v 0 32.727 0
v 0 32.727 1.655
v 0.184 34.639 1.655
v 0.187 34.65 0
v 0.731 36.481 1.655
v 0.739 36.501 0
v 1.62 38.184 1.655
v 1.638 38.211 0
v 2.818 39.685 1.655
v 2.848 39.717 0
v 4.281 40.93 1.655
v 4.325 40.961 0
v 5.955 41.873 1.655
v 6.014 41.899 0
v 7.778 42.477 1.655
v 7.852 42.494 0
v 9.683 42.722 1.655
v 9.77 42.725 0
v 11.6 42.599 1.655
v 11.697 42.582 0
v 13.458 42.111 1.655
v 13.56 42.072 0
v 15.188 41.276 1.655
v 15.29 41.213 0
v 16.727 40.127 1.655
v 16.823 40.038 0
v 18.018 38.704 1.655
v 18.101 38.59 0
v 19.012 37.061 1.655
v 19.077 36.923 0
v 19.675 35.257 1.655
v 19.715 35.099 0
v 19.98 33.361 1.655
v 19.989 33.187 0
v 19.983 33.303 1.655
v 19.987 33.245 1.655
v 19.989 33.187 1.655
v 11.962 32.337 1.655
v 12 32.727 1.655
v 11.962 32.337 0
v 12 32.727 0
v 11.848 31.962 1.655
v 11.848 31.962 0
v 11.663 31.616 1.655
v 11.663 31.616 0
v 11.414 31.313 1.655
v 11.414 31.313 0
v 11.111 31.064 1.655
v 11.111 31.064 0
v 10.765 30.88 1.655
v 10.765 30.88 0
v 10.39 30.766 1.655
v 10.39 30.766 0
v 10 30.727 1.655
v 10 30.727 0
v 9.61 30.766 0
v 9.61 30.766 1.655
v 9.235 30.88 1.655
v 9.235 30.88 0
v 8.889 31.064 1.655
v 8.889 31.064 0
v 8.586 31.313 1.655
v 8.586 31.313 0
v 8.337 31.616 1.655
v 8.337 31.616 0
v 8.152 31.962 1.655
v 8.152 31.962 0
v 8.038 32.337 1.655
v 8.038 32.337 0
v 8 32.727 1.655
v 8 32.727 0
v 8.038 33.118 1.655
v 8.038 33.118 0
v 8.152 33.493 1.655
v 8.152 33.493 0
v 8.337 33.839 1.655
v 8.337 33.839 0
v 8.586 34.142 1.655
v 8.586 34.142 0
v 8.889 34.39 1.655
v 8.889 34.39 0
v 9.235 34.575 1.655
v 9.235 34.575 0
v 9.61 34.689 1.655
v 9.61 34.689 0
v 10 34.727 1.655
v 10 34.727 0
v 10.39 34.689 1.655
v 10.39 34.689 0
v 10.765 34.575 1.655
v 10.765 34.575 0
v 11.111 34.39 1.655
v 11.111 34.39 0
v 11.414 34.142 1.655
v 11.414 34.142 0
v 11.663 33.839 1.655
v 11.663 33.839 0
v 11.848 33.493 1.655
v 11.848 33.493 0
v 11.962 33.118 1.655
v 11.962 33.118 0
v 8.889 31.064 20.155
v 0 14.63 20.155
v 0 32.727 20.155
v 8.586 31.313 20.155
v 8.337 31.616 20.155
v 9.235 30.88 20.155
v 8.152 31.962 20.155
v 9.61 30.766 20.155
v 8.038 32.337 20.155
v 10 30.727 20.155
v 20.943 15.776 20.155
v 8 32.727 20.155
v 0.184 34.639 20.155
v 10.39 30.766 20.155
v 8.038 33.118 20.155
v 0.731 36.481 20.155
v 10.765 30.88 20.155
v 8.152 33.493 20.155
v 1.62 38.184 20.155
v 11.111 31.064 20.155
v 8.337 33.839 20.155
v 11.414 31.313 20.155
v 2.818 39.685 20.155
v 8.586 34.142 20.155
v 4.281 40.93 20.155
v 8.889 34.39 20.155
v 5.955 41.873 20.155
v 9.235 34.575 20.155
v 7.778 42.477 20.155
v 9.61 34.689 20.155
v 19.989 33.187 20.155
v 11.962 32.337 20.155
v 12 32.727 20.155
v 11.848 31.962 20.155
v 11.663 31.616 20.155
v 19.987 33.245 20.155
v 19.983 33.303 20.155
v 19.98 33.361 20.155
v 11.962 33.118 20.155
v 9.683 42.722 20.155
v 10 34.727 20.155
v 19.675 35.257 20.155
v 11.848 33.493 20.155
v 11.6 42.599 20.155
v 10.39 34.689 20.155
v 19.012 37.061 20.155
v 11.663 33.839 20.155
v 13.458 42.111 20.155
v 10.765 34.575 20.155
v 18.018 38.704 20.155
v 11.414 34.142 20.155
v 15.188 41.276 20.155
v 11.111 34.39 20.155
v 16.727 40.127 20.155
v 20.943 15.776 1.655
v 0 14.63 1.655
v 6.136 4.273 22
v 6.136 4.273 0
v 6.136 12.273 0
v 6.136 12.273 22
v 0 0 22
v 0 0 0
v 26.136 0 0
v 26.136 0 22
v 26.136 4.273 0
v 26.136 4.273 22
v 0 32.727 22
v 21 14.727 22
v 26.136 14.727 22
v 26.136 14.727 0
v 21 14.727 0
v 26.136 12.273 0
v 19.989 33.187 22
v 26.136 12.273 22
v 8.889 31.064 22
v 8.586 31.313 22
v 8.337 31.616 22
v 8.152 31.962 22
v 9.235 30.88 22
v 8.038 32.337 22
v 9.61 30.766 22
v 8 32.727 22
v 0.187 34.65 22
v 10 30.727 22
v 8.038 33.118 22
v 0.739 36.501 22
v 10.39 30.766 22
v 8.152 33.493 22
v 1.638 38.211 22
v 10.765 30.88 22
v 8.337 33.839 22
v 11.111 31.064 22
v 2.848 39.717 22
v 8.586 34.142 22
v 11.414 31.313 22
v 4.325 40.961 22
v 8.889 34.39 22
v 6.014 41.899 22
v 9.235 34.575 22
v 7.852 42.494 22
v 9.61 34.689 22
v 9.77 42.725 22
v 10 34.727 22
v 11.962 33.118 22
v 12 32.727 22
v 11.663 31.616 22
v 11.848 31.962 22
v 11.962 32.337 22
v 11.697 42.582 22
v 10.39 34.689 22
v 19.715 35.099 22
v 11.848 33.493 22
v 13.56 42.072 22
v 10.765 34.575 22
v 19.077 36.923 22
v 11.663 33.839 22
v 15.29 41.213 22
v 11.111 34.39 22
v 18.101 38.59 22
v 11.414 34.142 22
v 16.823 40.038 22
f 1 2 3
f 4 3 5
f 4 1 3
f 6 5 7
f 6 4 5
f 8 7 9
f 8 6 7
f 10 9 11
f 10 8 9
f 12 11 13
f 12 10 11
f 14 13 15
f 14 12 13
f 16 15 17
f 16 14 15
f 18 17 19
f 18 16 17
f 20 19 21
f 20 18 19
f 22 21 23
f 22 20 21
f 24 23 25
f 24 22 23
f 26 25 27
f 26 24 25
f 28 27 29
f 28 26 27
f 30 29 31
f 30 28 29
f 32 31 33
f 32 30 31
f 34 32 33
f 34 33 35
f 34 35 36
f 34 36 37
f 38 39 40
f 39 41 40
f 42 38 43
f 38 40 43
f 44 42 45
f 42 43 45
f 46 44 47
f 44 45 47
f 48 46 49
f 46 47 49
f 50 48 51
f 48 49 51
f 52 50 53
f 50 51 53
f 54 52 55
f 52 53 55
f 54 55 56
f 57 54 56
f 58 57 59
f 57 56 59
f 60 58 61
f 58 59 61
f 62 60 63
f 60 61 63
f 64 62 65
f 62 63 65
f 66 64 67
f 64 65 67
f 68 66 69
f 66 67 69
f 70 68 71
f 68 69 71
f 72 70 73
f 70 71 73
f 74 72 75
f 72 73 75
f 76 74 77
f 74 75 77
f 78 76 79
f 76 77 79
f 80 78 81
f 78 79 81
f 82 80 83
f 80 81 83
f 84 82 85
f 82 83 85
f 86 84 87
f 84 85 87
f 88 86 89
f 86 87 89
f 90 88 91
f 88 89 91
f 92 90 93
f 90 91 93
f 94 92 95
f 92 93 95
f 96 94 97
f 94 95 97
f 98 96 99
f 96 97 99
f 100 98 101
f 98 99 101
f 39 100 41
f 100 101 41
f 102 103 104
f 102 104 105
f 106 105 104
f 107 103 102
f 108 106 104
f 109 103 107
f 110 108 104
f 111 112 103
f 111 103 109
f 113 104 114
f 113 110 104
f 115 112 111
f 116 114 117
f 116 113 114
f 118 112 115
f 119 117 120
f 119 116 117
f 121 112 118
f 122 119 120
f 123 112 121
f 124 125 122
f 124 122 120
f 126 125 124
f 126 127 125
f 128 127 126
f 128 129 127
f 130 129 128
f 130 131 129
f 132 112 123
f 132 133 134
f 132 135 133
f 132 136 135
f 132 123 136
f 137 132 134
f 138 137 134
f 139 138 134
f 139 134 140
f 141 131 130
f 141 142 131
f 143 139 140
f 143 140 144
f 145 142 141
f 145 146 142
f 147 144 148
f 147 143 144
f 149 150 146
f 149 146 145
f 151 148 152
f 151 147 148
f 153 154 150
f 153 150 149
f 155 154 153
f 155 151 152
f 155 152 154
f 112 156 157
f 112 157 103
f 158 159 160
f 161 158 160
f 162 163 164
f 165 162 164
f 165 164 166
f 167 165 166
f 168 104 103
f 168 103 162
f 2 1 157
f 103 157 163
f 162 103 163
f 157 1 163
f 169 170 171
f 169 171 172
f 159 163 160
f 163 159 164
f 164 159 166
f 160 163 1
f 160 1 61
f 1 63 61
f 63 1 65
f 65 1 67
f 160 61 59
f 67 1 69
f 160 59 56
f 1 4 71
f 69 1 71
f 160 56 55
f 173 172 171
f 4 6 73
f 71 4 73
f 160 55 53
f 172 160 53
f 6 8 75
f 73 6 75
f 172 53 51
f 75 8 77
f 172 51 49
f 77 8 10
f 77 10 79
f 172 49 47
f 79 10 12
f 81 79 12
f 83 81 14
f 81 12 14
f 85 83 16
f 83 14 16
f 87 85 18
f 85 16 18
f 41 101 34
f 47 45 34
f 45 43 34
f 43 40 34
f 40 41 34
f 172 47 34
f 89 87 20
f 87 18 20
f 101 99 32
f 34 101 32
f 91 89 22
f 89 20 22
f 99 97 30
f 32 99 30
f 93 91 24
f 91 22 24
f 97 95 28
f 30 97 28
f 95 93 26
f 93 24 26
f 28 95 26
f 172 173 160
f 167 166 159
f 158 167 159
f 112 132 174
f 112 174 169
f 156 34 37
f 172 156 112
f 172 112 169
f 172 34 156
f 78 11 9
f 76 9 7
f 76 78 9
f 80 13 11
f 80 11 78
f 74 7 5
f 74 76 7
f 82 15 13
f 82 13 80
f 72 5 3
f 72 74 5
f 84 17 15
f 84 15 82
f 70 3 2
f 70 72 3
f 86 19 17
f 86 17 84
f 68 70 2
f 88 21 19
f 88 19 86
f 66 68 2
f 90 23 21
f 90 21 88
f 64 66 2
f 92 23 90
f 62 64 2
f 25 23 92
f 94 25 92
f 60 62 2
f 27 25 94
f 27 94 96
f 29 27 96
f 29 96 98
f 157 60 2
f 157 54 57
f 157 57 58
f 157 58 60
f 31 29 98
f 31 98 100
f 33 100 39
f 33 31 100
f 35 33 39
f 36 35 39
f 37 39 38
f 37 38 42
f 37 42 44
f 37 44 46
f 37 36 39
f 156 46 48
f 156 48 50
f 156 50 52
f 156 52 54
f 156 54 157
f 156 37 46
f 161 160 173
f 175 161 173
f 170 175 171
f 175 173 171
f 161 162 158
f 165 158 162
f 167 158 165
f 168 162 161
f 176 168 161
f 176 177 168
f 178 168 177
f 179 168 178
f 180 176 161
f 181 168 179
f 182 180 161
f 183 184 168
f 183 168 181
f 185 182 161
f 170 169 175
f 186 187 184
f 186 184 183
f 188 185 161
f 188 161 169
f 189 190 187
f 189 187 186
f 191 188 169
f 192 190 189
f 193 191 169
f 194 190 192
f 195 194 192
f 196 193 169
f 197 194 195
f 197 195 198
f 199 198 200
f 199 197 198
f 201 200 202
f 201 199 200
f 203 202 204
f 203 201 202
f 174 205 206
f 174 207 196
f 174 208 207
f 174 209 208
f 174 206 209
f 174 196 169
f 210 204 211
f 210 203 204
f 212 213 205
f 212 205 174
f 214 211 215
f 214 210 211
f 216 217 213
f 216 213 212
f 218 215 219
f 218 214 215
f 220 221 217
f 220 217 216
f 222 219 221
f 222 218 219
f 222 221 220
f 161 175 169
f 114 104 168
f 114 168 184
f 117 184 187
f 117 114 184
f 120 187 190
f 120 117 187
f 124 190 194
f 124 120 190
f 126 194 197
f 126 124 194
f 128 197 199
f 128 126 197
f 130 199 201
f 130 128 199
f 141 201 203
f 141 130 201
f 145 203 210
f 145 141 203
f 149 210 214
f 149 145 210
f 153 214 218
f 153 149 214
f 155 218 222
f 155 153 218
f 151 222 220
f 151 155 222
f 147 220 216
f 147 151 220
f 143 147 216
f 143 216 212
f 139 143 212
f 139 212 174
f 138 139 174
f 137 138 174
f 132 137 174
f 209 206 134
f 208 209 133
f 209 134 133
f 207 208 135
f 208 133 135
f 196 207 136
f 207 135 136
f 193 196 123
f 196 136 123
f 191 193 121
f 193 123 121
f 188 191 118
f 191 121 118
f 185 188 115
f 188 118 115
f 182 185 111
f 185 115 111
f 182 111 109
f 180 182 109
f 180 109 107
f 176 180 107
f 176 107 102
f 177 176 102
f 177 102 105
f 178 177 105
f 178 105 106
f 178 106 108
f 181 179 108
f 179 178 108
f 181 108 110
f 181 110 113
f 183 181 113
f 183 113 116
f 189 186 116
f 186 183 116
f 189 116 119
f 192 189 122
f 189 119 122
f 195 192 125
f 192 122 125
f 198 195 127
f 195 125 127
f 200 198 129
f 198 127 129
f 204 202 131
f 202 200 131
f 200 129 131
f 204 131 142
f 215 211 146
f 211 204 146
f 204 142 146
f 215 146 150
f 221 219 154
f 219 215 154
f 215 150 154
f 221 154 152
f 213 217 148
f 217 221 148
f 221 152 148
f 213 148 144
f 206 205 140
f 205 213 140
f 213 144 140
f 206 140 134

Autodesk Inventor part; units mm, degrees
ref_plane "YZ Plane" through (0, 0, 0) normal (1, 0, 0) x (0, 1, 0)
ref_plane "XZ Plane" through (0, 0, 0) normal (0, 1, 0) x (-1, 0, 0)
ref_plane "XY Plane" through (0, 0, 0) normal (0, 0, 1) x (1, 0, 0)
sketch "Sketch1" plane through (0, 0, 0) normal (0, 0, 1) x (1, 0, 0)
  line L0 (0, 0) -> (26.1364, 0)
  line L1 (26.1364, 0) -> (26.1364, 4.2728)
  line L2 (26.1364, 4.2728) -> (6.1364, 4.2728)
  line L3 (6.1364, 4.2728) -> (6.1364, 12.2728)
  line L4 (6.1364, 12.2728) -> (26.1364, 12.2728)
  line L5 (26.1364, 12.2728) -> (26.1364, 14.7274)
  line L6 (26.1364, 14.7274) -> (0, 14.7274)
  line L7 (0, 14.7274) -> (0, 0)
  line L8 (0, 14.7274) -> (0, 32.7274)
  arc A0 (19.9894, 33.187) -> (0, 32.7274) centre (10, 32.7274) ccw
  line L9 (19.9894, 33.187) -> (21, 14.7274)
  circle A1 centre (10, 32.7274) radius 2
  dimension "d0" = 20
  dimension "d1" = 8
  dimension "d3" = 4
  dimension "d4" = 10
  dimension "d5" = 18
  dimension "d7" = 19.9894
extrude "Extrusion1" add sketch "Sketch1" along normal blind 22
sketch "Sketch2" plane through (19.9894, 33.187, 22) normal (0.9985049, 0.0546629, 0) x (0, 0, -1)
  line L0 (1.8448, -6.1786) -> (1.8448, -17.437)
  line L1 (20.3448, -6.1786) -> (20.3448, -17.437)
  line L2 (20.3448, -17.437) -> (1.8448, -17.437)
  line L3 (1.8448, -6.1786) -> (1.8448, 10.563)
  line L4 (1.8448, 10.563) -> (20.3448, 10.563)
  line L5 (20.3448, 10.563) -> (20.3448, -6.1786)
  dimension "d14" = 28
  dimension "d17" = 18.5
extrude "Extrusion2" cut sketch "Sketch2" against normal through all
sketch "Sketch3" plane through (19.9894, 33.187, 22) normal (-0.9985049, -0.0546629, 0) x (0, 0, 1)
  line L0 (-20.3448, 0.1742) -> (-1.8448, 0.1742) projected
  line L1 (-1.8448, 0.1742) -> (-17.8448, 0.1742)
  line L2 (-17.8448, 0.1742) -> (-17.8448, -0.1891)
  line L3 (-17.8448, -0.1891) -> (-1.8448, -0.1891)
  line L4 (-1.8448, -0.1891) -> (-1.8448, 0.1742)
  point P0 (-22, -32.0447)
extrude "Extrusion3" cut sketch "Sketch3" against normal through all
sketch "Sketch4" plane through (21, 14.7274, 22) normal (0.9985049, 0.0546629, 0) x (0, 0, -1)
  point P0 (22, -13.5574)
sketch "Sketch5" plane through (0, 0, 22) normal (0, 0, 1) x (1, 0, 0)
  point P0 (0, 0)
sketch "Sketch6" plane through (0, 0, 0) normal (0, 0, -1) x (-1, 0, 0)
  point P0 (0, 0)
sketch "Sketch7" plane through (0, 0, 22) normal (0, 0, 1) x (1, 0, 0)
  point P0 (0, 0)
sketch "Sketch8" plane through (19.9894, 33.187, 22) normal (-0.9985049, -0.0546629, 0) x (0, 0, 1)
  point P0 (-22, -32.0447)
sketch "Sketch9" plane through (19.9894, 33.187, 22) normal (-0.9985049, -0.0546629, 0) x (0, 0, 1)
  line L0 (-20.3448, 0) -> (-20.3448, -17.437) projected
  line L1 (-20.3448, 0.1742) -> (-17.8448, 0.1742) projected
  line L2 (-20.3448, 0) -> (-17.8448, 0)
  line L3 (-17.8448, 0) -> (-17.8448, 0.1742)
  line L4 (-17.8448, 0.1742) -> (-20.3448, 0.1742)
  line L5 (-20.3448, 0.1742) -> (-20.3448, 0)
  point P0 (-22, -32.0447)
extrude "Extrusion4" cut sketch "Sketch9" against normal through all
properties part number "Maintients poullie v1"
